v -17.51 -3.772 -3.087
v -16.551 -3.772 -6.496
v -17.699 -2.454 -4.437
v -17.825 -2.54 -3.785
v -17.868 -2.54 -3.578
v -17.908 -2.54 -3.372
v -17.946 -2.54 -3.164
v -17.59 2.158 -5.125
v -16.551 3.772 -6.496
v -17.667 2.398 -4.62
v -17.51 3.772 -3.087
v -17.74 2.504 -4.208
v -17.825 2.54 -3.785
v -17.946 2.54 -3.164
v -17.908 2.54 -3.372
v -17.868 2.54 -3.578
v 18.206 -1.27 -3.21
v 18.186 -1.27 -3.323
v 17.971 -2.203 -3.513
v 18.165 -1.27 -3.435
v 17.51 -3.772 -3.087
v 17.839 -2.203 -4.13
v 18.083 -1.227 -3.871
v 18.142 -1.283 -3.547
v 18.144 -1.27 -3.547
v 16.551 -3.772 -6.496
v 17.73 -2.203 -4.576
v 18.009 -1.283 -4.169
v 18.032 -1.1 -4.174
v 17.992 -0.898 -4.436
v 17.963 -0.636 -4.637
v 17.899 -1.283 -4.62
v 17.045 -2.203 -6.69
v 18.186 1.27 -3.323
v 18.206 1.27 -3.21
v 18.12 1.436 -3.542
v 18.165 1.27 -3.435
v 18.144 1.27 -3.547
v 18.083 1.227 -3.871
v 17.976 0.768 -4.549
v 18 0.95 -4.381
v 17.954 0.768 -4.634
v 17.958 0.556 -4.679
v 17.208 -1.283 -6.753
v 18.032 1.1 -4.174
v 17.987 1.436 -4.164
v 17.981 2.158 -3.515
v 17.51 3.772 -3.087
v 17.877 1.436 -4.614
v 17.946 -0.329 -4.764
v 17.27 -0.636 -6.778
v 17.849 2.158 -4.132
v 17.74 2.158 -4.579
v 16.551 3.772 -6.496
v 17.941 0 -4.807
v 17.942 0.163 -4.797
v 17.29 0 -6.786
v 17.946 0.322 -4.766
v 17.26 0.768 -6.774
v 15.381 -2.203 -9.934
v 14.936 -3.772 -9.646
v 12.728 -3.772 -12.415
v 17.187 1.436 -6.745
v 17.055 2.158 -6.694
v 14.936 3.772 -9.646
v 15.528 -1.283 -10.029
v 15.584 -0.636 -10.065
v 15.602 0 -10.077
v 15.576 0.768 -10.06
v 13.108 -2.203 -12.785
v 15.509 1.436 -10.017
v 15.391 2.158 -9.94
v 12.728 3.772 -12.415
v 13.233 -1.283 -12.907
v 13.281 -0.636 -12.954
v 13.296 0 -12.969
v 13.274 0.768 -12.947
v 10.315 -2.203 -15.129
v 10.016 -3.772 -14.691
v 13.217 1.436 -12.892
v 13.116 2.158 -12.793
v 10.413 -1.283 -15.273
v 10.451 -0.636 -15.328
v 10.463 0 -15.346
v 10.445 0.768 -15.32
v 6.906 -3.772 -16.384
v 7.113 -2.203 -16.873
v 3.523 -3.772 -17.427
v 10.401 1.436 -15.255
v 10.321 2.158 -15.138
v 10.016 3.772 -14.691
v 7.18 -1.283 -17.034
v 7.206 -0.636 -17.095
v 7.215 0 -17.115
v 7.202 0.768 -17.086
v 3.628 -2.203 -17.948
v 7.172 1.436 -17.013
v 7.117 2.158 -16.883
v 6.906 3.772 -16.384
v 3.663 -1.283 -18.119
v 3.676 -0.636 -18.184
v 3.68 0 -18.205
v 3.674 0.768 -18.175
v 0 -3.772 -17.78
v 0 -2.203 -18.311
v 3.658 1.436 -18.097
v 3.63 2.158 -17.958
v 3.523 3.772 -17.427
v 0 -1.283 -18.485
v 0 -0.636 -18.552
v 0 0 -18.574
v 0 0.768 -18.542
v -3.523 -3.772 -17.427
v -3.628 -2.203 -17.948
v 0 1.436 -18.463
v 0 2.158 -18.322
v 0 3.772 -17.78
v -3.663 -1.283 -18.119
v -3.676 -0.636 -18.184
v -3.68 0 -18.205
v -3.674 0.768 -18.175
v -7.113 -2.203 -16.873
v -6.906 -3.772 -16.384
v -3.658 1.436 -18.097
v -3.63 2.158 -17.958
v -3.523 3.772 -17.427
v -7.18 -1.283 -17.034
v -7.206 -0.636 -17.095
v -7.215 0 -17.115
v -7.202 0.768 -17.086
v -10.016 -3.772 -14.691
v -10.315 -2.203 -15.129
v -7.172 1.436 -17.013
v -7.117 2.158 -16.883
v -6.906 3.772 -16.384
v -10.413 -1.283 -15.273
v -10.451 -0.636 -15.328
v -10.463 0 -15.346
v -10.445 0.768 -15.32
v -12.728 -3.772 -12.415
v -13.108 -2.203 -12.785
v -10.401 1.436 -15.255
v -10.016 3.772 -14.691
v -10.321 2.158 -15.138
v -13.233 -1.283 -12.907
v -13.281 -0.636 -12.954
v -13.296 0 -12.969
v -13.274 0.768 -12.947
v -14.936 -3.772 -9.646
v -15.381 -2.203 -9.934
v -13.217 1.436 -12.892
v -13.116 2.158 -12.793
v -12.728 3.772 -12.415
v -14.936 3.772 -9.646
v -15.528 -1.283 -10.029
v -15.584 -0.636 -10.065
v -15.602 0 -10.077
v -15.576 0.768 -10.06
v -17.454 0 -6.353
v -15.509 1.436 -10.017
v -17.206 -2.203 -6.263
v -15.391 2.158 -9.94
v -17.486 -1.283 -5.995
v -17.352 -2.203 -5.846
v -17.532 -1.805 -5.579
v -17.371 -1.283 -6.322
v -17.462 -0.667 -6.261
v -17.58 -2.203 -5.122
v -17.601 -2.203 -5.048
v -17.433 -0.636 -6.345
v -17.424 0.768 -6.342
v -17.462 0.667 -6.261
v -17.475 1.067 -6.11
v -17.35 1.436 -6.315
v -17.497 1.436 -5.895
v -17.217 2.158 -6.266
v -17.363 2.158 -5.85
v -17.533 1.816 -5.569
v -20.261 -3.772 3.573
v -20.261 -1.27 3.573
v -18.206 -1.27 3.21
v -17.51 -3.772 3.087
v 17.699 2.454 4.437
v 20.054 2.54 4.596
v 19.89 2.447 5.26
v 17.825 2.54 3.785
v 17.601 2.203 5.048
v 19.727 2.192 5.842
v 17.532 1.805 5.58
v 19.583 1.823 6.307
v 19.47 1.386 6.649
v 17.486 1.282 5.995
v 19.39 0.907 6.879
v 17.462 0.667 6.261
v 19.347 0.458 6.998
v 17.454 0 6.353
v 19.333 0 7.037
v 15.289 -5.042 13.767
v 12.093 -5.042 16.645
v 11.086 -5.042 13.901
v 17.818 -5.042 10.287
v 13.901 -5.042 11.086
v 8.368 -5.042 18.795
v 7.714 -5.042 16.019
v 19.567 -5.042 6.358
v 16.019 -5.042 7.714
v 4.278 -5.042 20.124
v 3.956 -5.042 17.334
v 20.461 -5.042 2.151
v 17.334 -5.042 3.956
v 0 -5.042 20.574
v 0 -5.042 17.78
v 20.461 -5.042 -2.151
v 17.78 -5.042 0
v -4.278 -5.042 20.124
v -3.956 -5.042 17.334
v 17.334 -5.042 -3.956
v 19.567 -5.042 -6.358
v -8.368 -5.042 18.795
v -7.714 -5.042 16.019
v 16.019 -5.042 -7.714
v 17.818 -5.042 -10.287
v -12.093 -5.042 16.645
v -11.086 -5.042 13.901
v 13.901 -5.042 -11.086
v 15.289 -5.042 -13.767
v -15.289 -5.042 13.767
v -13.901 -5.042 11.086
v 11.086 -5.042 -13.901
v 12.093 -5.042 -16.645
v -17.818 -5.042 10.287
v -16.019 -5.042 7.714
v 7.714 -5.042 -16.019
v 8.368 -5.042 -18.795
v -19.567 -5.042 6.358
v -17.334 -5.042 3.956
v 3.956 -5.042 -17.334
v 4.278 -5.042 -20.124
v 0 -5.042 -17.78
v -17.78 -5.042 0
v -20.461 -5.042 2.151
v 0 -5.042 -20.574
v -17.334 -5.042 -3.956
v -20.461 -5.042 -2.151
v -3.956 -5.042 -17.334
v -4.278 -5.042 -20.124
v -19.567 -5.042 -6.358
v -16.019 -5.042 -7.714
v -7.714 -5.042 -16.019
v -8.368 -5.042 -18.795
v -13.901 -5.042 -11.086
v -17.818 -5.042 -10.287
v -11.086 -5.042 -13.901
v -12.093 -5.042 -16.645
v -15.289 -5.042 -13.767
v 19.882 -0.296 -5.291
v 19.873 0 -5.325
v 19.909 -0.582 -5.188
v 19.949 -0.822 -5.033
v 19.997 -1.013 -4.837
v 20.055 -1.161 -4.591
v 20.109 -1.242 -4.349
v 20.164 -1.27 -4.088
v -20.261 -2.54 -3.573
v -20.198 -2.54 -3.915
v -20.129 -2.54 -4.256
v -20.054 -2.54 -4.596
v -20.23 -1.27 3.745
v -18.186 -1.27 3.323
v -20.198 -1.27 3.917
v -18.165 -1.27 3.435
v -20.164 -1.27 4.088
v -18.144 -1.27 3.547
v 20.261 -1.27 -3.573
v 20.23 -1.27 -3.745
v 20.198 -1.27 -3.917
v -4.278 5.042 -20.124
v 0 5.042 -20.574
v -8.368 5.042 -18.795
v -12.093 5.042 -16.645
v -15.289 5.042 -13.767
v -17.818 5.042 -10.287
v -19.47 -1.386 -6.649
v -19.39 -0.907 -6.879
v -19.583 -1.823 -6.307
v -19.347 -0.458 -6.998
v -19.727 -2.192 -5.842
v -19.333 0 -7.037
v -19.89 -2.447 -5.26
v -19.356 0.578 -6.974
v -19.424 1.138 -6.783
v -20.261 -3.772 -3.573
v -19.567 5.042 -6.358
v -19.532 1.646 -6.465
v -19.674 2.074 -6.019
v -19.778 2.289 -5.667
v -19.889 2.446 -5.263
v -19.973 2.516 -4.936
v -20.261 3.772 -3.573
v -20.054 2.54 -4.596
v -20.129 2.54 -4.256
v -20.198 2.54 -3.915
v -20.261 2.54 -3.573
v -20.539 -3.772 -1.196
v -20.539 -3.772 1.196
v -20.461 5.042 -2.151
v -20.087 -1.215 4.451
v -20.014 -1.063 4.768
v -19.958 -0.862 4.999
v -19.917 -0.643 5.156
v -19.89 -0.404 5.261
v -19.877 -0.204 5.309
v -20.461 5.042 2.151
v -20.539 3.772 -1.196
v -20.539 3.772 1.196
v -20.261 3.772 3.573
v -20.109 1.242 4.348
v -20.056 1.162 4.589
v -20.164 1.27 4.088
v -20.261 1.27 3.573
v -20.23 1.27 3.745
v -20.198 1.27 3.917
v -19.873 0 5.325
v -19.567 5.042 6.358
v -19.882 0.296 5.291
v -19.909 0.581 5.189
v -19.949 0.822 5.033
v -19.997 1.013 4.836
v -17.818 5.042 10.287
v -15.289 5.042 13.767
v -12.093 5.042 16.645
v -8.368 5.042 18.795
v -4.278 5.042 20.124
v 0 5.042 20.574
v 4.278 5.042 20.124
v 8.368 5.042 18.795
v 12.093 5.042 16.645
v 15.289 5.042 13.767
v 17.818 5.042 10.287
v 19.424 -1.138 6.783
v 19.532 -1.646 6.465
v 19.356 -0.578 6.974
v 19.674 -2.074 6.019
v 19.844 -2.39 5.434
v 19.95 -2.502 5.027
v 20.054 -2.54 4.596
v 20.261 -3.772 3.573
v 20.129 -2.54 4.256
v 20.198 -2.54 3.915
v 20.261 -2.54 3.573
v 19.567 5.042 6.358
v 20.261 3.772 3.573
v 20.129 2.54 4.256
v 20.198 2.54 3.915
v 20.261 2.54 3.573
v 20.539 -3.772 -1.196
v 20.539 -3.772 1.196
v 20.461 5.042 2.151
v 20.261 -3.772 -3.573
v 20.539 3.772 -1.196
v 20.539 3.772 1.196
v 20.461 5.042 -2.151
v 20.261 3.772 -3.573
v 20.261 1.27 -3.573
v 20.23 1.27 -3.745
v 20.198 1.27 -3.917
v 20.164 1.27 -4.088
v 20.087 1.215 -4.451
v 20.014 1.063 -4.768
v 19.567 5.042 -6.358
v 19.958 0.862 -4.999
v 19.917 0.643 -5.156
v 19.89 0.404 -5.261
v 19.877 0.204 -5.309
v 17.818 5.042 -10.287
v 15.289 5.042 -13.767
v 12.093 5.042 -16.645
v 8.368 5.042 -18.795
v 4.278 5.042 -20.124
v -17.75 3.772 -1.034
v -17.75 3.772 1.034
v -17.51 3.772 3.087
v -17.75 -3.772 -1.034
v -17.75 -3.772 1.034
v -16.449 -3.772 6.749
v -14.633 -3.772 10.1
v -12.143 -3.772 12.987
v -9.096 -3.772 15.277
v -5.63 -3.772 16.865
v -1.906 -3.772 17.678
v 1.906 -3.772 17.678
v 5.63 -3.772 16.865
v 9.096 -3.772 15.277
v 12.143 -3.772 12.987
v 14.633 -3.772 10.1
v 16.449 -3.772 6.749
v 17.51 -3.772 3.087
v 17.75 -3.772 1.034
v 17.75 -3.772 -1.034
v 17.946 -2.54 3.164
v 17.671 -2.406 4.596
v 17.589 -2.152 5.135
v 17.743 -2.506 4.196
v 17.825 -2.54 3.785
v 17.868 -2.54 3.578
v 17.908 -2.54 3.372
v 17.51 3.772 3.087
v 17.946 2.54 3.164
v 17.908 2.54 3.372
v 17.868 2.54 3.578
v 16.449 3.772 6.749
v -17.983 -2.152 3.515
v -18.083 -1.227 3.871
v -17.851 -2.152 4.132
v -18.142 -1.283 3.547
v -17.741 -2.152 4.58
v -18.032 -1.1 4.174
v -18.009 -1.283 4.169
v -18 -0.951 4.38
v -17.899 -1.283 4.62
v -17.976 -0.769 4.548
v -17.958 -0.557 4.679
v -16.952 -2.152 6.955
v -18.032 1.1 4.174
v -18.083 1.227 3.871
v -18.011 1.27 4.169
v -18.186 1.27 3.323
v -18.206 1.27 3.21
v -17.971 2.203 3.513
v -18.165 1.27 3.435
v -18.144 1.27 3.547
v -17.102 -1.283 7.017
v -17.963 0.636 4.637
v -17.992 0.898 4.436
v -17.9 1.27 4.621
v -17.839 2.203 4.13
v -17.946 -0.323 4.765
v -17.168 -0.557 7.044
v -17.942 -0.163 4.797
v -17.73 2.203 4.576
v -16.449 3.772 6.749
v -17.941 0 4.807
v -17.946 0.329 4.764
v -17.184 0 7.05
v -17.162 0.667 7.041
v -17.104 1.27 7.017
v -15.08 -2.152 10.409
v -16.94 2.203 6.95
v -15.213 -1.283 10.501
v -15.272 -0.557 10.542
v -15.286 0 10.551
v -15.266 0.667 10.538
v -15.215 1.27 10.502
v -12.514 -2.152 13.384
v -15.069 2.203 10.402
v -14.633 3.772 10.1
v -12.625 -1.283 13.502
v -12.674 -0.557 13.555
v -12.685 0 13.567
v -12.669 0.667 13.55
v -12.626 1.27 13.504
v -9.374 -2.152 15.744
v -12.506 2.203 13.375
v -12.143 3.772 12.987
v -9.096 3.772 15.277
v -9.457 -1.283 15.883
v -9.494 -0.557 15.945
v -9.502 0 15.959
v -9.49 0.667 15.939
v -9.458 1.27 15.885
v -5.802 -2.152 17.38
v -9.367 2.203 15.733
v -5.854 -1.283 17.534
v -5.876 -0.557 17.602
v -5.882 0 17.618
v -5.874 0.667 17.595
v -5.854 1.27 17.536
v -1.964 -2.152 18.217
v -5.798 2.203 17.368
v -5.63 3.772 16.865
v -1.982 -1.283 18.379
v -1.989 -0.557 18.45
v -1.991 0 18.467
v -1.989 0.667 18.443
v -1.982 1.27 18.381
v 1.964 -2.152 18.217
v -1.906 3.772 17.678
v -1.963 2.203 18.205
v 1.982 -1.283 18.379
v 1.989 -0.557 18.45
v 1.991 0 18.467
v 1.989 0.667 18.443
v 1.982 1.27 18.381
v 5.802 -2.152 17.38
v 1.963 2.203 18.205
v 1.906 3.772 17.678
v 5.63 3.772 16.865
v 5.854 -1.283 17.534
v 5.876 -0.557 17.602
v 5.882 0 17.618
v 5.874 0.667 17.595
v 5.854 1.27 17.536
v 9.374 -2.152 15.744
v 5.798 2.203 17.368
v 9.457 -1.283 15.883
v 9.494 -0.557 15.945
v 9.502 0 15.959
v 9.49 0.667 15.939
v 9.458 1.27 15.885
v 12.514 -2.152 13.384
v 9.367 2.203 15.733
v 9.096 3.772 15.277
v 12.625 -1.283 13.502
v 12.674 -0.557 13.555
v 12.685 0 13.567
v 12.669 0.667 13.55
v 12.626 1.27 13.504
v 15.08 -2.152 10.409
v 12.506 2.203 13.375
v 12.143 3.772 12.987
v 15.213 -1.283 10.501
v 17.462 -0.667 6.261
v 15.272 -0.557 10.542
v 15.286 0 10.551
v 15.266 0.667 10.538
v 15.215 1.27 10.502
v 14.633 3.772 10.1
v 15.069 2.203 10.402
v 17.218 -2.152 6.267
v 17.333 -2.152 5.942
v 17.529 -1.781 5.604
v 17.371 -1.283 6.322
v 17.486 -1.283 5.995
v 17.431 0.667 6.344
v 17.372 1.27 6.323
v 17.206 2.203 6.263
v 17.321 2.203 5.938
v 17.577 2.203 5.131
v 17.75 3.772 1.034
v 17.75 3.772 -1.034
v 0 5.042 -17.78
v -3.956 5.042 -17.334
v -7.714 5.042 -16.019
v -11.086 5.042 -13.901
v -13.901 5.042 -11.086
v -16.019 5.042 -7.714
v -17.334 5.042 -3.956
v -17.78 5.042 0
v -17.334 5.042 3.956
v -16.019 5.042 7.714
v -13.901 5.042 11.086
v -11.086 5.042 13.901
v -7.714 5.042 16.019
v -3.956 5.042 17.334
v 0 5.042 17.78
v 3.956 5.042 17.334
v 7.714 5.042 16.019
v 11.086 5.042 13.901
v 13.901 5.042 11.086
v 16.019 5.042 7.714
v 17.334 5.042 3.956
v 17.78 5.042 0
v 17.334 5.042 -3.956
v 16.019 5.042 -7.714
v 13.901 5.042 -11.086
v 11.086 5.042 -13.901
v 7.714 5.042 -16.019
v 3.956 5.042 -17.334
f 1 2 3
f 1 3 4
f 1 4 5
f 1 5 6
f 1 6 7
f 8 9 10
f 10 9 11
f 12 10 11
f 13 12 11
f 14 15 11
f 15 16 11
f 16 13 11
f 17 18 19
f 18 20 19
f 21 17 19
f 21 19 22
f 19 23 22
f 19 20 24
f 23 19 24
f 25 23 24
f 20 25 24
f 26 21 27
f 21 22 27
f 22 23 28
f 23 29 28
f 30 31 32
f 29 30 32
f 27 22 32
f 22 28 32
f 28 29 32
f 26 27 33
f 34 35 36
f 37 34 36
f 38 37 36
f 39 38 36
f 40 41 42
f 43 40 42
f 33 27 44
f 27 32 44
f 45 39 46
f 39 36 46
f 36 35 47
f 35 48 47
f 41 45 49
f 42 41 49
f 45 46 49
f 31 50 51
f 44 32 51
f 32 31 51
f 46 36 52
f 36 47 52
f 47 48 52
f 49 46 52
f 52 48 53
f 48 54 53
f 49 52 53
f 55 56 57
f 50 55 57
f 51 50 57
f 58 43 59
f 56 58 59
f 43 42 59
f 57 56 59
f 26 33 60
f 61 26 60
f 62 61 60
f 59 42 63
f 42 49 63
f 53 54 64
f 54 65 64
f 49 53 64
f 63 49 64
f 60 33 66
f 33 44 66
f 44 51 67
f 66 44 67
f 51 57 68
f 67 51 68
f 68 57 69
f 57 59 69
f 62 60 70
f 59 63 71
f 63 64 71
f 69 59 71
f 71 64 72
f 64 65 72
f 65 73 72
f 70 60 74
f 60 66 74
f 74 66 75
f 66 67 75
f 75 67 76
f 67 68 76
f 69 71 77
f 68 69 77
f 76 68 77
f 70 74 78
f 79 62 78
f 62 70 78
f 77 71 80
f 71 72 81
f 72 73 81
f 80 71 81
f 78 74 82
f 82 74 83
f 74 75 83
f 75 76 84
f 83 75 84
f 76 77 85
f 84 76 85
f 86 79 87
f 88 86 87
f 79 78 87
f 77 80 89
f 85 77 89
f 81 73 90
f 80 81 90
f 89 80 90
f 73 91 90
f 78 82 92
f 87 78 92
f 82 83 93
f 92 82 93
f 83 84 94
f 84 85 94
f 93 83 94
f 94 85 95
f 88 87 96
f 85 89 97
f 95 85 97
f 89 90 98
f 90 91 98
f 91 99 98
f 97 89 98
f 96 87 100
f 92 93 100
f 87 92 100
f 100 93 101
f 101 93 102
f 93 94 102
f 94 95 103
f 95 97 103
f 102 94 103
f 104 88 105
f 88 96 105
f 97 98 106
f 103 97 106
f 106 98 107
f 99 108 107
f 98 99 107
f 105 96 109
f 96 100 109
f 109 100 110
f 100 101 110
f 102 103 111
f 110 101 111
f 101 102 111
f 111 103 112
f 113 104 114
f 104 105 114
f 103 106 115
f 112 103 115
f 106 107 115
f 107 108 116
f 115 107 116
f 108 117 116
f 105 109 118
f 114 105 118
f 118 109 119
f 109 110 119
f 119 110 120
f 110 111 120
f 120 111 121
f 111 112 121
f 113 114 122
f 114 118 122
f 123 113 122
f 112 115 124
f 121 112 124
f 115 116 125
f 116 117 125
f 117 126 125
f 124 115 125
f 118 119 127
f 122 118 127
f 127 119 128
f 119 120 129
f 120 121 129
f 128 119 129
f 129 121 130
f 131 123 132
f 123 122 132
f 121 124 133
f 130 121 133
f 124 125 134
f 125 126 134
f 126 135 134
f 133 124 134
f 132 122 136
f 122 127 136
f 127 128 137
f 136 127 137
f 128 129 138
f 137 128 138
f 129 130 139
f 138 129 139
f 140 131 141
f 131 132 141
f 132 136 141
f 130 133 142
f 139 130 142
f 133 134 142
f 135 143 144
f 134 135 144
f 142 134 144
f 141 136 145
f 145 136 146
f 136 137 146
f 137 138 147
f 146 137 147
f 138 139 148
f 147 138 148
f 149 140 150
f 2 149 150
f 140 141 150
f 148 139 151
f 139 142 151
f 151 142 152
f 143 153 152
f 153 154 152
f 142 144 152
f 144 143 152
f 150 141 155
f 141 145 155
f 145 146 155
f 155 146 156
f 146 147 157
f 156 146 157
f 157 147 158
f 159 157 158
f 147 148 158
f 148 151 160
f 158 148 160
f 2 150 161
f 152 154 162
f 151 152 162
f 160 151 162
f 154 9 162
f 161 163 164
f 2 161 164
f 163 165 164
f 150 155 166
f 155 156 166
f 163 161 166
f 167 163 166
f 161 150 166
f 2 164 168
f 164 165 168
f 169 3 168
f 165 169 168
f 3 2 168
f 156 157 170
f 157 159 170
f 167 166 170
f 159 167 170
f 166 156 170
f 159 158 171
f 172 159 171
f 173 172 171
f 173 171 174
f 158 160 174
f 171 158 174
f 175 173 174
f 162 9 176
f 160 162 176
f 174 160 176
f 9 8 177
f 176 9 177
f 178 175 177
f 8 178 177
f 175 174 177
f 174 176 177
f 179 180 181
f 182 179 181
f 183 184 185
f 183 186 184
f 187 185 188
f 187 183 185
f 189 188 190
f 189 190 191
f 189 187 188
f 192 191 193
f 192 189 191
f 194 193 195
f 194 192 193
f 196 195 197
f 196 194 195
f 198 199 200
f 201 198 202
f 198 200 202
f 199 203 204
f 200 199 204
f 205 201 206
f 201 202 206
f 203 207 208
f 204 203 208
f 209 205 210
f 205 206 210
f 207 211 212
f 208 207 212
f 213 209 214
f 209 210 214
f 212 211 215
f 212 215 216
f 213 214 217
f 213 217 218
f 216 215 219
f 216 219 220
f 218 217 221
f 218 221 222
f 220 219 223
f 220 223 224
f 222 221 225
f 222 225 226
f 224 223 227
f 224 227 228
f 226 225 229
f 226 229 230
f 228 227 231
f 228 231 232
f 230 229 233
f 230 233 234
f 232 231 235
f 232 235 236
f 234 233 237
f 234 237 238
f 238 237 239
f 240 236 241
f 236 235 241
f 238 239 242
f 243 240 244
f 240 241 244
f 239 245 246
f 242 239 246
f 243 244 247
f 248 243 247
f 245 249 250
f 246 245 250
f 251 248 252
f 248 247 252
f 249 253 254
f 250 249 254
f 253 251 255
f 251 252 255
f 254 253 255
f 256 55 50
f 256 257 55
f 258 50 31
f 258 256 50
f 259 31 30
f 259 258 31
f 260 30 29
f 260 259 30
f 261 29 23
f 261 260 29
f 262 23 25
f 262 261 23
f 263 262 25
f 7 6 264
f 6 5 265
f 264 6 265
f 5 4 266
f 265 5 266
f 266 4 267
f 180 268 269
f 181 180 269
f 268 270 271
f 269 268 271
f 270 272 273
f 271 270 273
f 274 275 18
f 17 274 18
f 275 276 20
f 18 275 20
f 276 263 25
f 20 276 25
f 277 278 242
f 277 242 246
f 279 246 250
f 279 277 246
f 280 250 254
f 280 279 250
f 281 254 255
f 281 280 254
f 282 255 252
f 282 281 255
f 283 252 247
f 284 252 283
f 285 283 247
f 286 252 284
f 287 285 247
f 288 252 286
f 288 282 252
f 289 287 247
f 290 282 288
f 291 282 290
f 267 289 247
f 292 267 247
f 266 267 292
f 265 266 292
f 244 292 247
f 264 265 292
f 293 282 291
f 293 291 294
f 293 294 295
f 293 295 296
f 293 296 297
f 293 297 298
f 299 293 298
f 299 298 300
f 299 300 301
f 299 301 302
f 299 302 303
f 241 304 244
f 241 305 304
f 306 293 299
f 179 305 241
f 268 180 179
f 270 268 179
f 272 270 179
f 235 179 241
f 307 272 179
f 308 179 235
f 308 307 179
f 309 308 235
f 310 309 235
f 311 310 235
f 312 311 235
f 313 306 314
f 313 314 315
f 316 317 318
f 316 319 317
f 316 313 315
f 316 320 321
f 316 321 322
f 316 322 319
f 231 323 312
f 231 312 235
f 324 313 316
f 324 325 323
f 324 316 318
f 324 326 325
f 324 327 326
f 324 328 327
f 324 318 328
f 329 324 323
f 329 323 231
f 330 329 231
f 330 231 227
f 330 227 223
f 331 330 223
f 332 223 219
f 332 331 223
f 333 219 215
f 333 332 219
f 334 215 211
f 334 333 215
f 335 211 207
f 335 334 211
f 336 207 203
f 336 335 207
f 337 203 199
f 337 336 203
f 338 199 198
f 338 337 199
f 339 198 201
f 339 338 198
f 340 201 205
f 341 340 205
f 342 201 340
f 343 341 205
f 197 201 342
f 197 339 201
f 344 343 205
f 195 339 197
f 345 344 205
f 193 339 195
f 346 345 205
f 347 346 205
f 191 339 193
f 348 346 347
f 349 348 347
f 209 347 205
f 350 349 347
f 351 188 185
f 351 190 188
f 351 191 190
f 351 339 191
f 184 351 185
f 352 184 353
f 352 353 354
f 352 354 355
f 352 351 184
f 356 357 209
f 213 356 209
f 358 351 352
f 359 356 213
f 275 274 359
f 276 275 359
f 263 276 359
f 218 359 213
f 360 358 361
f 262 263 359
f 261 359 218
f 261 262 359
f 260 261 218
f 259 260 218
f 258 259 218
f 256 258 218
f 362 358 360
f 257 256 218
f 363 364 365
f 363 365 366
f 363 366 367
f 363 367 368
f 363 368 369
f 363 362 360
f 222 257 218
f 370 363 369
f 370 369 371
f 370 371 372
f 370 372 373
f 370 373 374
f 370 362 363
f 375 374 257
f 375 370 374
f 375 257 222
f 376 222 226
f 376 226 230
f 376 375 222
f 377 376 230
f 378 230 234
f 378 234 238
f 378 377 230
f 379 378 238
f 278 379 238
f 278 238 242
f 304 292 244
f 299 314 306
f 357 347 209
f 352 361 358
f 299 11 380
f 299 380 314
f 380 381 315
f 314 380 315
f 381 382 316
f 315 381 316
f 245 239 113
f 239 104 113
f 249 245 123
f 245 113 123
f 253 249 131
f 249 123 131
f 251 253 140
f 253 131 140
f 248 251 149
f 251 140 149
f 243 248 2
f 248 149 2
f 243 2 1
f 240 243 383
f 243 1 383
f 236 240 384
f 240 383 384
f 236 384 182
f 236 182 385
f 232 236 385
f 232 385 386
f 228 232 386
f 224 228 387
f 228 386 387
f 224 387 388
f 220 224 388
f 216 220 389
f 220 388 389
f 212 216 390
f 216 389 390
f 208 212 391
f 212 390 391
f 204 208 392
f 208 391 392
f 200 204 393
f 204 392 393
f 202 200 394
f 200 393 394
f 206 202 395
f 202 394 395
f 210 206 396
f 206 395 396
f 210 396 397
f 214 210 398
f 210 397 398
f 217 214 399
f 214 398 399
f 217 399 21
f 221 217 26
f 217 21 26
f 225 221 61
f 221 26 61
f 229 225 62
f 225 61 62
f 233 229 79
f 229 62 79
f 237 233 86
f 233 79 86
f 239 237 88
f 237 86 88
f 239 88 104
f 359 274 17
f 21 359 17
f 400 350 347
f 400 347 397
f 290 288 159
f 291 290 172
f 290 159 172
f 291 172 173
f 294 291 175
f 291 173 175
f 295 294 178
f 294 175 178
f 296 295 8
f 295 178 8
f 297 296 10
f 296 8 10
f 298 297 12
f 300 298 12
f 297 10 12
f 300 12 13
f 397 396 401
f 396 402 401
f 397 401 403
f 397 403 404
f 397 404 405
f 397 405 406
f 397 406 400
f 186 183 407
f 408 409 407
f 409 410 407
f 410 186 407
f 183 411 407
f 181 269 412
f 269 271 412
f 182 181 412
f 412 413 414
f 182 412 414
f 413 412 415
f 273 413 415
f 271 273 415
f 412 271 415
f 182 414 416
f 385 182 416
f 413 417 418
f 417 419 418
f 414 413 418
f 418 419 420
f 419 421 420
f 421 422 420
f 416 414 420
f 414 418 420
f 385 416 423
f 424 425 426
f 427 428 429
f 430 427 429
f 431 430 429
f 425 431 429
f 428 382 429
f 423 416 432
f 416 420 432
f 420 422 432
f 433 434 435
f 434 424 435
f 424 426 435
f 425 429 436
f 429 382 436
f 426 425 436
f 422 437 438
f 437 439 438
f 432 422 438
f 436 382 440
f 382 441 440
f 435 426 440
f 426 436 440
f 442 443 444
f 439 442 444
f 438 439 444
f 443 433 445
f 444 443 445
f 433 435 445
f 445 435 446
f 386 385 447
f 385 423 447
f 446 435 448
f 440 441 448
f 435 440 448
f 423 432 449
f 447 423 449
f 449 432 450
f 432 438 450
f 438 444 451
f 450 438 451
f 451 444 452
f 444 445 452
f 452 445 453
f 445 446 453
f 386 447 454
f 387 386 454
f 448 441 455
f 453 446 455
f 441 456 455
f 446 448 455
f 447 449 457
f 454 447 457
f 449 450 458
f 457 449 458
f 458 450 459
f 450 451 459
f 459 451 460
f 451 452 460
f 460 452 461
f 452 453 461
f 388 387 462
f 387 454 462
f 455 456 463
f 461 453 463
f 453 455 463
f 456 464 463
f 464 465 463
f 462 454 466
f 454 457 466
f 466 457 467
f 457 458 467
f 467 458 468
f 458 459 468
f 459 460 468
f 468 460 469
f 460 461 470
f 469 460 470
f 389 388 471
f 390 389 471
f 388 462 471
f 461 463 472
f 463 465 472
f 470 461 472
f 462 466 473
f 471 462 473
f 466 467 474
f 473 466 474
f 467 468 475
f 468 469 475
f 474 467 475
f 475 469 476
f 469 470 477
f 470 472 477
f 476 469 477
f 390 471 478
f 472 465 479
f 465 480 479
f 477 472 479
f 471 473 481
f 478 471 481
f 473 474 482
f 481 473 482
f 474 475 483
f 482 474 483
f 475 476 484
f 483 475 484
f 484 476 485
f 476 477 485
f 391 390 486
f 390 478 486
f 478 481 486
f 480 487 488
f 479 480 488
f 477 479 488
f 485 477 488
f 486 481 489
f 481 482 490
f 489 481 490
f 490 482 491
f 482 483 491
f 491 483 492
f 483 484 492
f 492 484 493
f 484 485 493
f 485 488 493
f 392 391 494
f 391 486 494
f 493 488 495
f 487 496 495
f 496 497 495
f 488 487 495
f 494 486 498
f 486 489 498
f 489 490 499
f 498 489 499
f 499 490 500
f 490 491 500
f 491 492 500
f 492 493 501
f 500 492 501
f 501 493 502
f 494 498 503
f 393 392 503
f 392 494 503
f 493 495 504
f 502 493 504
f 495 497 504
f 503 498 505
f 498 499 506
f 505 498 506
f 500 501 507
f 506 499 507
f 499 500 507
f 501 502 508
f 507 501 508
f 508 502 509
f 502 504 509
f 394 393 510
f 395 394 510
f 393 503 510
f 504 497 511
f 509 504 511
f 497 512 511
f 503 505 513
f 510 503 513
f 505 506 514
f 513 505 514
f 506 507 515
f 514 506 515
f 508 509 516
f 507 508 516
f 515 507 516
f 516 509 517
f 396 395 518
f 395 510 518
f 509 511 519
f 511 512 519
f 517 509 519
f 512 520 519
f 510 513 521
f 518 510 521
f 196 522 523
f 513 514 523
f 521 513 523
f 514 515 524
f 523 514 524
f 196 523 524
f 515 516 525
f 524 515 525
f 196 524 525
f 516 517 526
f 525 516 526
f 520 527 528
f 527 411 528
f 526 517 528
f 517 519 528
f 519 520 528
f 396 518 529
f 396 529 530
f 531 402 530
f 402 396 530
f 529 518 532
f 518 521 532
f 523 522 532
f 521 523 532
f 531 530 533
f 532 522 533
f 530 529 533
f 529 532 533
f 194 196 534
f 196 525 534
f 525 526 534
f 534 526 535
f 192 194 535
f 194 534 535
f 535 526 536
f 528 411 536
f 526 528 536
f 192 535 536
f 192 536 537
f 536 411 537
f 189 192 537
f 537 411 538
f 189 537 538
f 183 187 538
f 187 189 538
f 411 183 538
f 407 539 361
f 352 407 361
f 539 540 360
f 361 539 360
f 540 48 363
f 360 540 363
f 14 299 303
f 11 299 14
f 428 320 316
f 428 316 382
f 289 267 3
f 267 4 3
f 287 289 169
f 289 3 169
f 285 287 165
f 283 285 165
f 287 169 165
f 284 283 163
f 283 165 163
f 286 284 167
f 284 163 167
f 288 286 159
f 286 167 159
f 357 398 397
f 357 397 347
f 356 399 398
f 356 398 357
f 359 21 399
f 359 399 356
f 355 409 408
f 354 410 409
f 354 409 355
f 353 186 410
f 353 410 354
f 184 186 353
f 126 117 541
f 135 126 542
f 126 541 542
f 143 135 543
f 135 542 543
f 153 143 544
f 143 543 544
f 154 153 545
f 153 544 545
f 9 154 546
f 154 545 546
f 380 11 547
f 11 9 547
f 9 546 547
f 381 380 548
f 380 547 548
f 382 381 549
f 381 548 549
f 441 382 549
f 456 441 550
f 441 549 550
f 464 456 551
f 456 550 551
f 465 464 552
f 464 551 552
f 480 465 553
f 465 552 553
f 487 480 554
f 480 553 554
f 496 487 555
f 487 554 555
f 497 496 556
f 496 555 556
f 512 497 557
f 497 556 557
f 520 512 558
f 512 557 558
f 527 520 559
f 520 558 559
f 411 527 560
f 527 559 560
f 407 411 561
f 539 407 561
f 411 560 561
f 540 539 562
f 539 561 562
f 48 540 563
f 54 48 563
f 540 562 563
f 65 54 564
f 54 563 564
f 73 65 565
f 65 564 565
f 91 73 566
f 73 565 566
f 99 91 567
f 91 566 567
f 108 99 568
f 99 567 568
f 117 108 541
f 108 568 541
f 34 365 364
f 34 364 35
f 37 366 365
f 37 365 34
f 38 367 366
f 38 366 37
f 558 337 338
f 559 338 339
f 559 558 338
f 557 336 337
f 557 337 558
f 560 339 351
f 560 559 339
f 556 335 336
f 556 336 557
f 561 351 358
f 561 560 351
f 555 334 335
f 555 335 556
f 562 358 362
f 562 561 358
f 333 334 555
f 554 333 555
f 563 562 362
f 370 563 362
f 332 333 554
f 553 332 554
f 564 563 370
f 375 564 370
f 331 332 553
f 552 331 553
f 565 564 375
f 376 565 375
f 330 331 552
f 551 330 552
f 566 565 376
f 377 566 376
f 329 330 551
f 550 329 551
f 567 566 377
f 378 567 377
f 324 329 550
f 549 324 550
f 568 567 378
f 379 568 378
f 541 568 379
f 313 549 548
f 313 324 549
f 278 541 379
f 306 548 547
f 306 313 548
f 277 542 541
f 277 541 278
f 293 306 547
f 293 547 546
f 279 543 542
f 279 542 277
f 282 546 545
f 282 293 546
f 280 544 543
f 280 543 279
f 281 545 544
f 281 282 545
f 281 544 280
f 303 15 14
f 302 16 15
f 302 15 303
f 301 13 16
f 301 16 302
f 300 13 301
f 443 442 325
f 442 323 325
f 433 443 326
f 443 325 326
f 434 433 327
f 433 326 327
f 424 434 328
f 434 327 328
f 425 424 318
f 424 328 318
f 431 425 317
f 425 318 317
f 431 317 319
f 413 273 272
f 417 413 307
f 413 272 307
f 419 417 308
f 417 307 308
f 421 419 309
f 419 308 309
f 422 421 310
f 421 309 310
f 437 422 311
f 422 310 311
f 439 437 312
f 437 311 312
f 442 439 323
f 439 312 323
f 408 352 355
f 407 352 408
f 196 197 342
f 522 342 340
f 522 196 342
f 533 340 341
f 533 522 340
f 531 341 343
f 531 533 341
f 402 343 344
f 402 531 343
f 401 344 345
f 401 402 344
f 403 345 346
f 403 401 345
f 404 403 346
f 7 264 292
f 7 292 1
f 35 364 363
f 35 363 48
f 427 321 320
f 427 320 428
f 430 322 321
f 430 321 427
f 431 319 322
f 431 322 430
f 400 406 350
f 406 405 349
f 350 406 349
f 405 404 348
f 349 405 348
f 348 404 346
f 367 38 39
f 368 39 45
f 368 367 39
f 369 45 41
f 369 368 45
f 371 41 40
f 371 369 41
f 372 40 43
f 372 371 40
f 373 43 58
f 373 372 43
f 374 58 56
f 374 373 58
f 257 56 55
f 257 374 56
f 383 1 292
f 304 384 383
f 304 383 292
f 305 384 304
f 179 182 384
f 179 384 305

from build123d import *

# Parameters (mm, degrees)
SKETCH1_W          = 2.794
SKETCH1_H          = 10.0838
SKETCH7_W          = 10.16
SKETCH7_H          = 7.5438
CUT_REVOLVE2_ANGLE = 20
SKETCH8_W          = 10.16
SKETCH8_H          = 5.08
CUT_REVOLVE3_ANGLE = 10
SKETCH9_W          = 10.16
SKETCH9_H          = 2.54
CUT_REVOLVE4_ANGLE = 5
CIRPATTERN2_COUNT  = 2
FILLET1_R          = 2.54
FILLET2_R          = 1.27


with BuildPart() as part:
    # Sketch1 → Revolve1 (revolve)
    with BuildSketch(Plane.XY, mode=Mode.PRIVATE) as revolve1_sk:
        with Locations((-19.177, 0)):
            Rectangle(SKETCH1_W, SKETCH1_H)
    revolve(revolve1_sk.sketch.rotate(Axis((0, 0, 0), (0, 1, 0)), 270), axis=Axis((0, 0, 0), (0, 1, 0)))

    # Sketch2 → Cut-Revolve1 (revolve, cut)
    with BuildSketch(Plane.XY, mode=Mode.PRIVATE) as cut_revolve1_sk:
        with BuildLine():
            Line((-17.78, 3.7719), (-15.24, 3.7719))
            Line((-15.24, 3.7719), (-15.24, -3.7719))
            Line((-15.24, -3.7719), (-17.78, -3.7719))
            ThreePointArc((-17.78, -3.7719), (-18.57375, 0), (-17.78, 3.7719))
        make_face()
    revolve(cut_revolve1_sk.sketch.rotate(Axis((0, 0, 0), (0, 1, 0)), 270), axis=Axis((0, 0, 0), (0, 1, 0)), mode=Mode.SUBTRACT)

    # Sketch7 → Cut-Revolve2 (revolve, symmetric, cut)
    with BuildSketch(Plane.XY) as cut_revolve2_sk:
        with Locations((-22.86, 0)):
            Rectangle(SKETCH7_W, SKETCH7_H)
    cut_revolve2 = revolve(axis=Axis((0, 0, 0), (0, 1, 0)), revolution_arc=CUT_REVOLVE2_ANGLE / 2, mode=Mode.SUBTRACT)
    cut_revolve2 = cut_revolve2 + revolve(cut_revolve2_sk.sketch, axis=Axis((0, 0, 0), (0, -1, 0)), revolution_arc=CUT_REVOLVE2_ANGLE / 2, mode=Mode.SUBTRACT)

    # Sketch8 → Cut-Revolve3 (revolve, cut)
    with BuildSketch(Plane(origin=(0, 0, 0), x_dir=(0.9848077530122081, 0, 0.17364817766693072), z_dir=(-0.17364817766693072, 0, 0.9848077530122081))):
        with Locations((-23.302480977, 0)):
            Rectangle(SKETCH8_W, SKETCH8_H)
    cut_revolve3 = revolve(axis=Axis((0, 0, 0), (0, -1, 0)), revolution_arc=CUT_REVOLVE3_ANGLE, mode=Mode.SUBTRACT)

    # Sketch9 → Cut-Revolve4 (revolve, cut)
    with BuildSketch(Plane(origin=(0, 0, 0), x_dir=(-0.9848077530122081, 0, 0.17364817766693075), z_dir=(-0.17364817766693075, 0, -0.9848077530122081))):
        with Locations((23.567180389, 0)):
            Rectangle(SKETCH9_W, SKETCH9_H)
    cut_revolve4 = revolve(axis=Axis((0, 0, 0), (0, 1, 0)), revolution_arc=CUT_REVOLVE4_ANGLE, mode=Mode.SUBTRACT)

    # CirPattern2: Cut-Revolve2, Cut-Revolve3, Cut-Revolve4 ×2 about axis
    cirpattern2_axis = Axis((0, 0, 0), (0, 1, 0))
    add([cut_revolve2.rotate(cirpattern2_axis, i * 360 / CIRPATTERN2_COUNT) for i in range(1, CIRPATTERN2_COUNT)], mode=Mode.SUBTRACT)
    add([cut_revolve3.rotate(cirpattern2_axis, i * 360 / CIRPATTERN2_COUNT) for i in range(1, CIRPATTERN2_COUNT)], mode=Mode.SUBTRACT)
    add([cut_revolve4.rotate(cirpattern2_axis, i * 360 / CIRPATTERN2_COUNT) for i in range(1, CIRPATTERN2_COUNT)], mode=Mode.SUBTRACT)

    # Fillet1
    fillet1_edges = [part.edges().sort_by_distance(p)[0] for p in [
        (18.228383443, 2.54, 6.634588992),
        (18.228383443, -2.54, 6.634588992),
        (-18.228383443, -2.54, -6.634588992),
        (-18.228383443, 2.54, -6.634588992),
    ]]
    fillet(fillet1_edges, radius=FILLET1_R - 0.0001)  # a hair under: the kernel refuses the full size

    # Fillet2
    fillet2_edges = [part.edges().sort_by_distance(p)[0] for p in [
        (-18.865101471, -1.27, 5.054888704),
        (-18.865101471, 1.27, 5.054888704),
        (18.865101471, -1.27, -5.054888704),
        (18.865101471, 1.27, -5.054888704),
    ]]
    fillet(fillet2_edges, radius=FILLET2_R - 0.0001)  # a hair under: the kernel refuses the full size


solid = part.part
